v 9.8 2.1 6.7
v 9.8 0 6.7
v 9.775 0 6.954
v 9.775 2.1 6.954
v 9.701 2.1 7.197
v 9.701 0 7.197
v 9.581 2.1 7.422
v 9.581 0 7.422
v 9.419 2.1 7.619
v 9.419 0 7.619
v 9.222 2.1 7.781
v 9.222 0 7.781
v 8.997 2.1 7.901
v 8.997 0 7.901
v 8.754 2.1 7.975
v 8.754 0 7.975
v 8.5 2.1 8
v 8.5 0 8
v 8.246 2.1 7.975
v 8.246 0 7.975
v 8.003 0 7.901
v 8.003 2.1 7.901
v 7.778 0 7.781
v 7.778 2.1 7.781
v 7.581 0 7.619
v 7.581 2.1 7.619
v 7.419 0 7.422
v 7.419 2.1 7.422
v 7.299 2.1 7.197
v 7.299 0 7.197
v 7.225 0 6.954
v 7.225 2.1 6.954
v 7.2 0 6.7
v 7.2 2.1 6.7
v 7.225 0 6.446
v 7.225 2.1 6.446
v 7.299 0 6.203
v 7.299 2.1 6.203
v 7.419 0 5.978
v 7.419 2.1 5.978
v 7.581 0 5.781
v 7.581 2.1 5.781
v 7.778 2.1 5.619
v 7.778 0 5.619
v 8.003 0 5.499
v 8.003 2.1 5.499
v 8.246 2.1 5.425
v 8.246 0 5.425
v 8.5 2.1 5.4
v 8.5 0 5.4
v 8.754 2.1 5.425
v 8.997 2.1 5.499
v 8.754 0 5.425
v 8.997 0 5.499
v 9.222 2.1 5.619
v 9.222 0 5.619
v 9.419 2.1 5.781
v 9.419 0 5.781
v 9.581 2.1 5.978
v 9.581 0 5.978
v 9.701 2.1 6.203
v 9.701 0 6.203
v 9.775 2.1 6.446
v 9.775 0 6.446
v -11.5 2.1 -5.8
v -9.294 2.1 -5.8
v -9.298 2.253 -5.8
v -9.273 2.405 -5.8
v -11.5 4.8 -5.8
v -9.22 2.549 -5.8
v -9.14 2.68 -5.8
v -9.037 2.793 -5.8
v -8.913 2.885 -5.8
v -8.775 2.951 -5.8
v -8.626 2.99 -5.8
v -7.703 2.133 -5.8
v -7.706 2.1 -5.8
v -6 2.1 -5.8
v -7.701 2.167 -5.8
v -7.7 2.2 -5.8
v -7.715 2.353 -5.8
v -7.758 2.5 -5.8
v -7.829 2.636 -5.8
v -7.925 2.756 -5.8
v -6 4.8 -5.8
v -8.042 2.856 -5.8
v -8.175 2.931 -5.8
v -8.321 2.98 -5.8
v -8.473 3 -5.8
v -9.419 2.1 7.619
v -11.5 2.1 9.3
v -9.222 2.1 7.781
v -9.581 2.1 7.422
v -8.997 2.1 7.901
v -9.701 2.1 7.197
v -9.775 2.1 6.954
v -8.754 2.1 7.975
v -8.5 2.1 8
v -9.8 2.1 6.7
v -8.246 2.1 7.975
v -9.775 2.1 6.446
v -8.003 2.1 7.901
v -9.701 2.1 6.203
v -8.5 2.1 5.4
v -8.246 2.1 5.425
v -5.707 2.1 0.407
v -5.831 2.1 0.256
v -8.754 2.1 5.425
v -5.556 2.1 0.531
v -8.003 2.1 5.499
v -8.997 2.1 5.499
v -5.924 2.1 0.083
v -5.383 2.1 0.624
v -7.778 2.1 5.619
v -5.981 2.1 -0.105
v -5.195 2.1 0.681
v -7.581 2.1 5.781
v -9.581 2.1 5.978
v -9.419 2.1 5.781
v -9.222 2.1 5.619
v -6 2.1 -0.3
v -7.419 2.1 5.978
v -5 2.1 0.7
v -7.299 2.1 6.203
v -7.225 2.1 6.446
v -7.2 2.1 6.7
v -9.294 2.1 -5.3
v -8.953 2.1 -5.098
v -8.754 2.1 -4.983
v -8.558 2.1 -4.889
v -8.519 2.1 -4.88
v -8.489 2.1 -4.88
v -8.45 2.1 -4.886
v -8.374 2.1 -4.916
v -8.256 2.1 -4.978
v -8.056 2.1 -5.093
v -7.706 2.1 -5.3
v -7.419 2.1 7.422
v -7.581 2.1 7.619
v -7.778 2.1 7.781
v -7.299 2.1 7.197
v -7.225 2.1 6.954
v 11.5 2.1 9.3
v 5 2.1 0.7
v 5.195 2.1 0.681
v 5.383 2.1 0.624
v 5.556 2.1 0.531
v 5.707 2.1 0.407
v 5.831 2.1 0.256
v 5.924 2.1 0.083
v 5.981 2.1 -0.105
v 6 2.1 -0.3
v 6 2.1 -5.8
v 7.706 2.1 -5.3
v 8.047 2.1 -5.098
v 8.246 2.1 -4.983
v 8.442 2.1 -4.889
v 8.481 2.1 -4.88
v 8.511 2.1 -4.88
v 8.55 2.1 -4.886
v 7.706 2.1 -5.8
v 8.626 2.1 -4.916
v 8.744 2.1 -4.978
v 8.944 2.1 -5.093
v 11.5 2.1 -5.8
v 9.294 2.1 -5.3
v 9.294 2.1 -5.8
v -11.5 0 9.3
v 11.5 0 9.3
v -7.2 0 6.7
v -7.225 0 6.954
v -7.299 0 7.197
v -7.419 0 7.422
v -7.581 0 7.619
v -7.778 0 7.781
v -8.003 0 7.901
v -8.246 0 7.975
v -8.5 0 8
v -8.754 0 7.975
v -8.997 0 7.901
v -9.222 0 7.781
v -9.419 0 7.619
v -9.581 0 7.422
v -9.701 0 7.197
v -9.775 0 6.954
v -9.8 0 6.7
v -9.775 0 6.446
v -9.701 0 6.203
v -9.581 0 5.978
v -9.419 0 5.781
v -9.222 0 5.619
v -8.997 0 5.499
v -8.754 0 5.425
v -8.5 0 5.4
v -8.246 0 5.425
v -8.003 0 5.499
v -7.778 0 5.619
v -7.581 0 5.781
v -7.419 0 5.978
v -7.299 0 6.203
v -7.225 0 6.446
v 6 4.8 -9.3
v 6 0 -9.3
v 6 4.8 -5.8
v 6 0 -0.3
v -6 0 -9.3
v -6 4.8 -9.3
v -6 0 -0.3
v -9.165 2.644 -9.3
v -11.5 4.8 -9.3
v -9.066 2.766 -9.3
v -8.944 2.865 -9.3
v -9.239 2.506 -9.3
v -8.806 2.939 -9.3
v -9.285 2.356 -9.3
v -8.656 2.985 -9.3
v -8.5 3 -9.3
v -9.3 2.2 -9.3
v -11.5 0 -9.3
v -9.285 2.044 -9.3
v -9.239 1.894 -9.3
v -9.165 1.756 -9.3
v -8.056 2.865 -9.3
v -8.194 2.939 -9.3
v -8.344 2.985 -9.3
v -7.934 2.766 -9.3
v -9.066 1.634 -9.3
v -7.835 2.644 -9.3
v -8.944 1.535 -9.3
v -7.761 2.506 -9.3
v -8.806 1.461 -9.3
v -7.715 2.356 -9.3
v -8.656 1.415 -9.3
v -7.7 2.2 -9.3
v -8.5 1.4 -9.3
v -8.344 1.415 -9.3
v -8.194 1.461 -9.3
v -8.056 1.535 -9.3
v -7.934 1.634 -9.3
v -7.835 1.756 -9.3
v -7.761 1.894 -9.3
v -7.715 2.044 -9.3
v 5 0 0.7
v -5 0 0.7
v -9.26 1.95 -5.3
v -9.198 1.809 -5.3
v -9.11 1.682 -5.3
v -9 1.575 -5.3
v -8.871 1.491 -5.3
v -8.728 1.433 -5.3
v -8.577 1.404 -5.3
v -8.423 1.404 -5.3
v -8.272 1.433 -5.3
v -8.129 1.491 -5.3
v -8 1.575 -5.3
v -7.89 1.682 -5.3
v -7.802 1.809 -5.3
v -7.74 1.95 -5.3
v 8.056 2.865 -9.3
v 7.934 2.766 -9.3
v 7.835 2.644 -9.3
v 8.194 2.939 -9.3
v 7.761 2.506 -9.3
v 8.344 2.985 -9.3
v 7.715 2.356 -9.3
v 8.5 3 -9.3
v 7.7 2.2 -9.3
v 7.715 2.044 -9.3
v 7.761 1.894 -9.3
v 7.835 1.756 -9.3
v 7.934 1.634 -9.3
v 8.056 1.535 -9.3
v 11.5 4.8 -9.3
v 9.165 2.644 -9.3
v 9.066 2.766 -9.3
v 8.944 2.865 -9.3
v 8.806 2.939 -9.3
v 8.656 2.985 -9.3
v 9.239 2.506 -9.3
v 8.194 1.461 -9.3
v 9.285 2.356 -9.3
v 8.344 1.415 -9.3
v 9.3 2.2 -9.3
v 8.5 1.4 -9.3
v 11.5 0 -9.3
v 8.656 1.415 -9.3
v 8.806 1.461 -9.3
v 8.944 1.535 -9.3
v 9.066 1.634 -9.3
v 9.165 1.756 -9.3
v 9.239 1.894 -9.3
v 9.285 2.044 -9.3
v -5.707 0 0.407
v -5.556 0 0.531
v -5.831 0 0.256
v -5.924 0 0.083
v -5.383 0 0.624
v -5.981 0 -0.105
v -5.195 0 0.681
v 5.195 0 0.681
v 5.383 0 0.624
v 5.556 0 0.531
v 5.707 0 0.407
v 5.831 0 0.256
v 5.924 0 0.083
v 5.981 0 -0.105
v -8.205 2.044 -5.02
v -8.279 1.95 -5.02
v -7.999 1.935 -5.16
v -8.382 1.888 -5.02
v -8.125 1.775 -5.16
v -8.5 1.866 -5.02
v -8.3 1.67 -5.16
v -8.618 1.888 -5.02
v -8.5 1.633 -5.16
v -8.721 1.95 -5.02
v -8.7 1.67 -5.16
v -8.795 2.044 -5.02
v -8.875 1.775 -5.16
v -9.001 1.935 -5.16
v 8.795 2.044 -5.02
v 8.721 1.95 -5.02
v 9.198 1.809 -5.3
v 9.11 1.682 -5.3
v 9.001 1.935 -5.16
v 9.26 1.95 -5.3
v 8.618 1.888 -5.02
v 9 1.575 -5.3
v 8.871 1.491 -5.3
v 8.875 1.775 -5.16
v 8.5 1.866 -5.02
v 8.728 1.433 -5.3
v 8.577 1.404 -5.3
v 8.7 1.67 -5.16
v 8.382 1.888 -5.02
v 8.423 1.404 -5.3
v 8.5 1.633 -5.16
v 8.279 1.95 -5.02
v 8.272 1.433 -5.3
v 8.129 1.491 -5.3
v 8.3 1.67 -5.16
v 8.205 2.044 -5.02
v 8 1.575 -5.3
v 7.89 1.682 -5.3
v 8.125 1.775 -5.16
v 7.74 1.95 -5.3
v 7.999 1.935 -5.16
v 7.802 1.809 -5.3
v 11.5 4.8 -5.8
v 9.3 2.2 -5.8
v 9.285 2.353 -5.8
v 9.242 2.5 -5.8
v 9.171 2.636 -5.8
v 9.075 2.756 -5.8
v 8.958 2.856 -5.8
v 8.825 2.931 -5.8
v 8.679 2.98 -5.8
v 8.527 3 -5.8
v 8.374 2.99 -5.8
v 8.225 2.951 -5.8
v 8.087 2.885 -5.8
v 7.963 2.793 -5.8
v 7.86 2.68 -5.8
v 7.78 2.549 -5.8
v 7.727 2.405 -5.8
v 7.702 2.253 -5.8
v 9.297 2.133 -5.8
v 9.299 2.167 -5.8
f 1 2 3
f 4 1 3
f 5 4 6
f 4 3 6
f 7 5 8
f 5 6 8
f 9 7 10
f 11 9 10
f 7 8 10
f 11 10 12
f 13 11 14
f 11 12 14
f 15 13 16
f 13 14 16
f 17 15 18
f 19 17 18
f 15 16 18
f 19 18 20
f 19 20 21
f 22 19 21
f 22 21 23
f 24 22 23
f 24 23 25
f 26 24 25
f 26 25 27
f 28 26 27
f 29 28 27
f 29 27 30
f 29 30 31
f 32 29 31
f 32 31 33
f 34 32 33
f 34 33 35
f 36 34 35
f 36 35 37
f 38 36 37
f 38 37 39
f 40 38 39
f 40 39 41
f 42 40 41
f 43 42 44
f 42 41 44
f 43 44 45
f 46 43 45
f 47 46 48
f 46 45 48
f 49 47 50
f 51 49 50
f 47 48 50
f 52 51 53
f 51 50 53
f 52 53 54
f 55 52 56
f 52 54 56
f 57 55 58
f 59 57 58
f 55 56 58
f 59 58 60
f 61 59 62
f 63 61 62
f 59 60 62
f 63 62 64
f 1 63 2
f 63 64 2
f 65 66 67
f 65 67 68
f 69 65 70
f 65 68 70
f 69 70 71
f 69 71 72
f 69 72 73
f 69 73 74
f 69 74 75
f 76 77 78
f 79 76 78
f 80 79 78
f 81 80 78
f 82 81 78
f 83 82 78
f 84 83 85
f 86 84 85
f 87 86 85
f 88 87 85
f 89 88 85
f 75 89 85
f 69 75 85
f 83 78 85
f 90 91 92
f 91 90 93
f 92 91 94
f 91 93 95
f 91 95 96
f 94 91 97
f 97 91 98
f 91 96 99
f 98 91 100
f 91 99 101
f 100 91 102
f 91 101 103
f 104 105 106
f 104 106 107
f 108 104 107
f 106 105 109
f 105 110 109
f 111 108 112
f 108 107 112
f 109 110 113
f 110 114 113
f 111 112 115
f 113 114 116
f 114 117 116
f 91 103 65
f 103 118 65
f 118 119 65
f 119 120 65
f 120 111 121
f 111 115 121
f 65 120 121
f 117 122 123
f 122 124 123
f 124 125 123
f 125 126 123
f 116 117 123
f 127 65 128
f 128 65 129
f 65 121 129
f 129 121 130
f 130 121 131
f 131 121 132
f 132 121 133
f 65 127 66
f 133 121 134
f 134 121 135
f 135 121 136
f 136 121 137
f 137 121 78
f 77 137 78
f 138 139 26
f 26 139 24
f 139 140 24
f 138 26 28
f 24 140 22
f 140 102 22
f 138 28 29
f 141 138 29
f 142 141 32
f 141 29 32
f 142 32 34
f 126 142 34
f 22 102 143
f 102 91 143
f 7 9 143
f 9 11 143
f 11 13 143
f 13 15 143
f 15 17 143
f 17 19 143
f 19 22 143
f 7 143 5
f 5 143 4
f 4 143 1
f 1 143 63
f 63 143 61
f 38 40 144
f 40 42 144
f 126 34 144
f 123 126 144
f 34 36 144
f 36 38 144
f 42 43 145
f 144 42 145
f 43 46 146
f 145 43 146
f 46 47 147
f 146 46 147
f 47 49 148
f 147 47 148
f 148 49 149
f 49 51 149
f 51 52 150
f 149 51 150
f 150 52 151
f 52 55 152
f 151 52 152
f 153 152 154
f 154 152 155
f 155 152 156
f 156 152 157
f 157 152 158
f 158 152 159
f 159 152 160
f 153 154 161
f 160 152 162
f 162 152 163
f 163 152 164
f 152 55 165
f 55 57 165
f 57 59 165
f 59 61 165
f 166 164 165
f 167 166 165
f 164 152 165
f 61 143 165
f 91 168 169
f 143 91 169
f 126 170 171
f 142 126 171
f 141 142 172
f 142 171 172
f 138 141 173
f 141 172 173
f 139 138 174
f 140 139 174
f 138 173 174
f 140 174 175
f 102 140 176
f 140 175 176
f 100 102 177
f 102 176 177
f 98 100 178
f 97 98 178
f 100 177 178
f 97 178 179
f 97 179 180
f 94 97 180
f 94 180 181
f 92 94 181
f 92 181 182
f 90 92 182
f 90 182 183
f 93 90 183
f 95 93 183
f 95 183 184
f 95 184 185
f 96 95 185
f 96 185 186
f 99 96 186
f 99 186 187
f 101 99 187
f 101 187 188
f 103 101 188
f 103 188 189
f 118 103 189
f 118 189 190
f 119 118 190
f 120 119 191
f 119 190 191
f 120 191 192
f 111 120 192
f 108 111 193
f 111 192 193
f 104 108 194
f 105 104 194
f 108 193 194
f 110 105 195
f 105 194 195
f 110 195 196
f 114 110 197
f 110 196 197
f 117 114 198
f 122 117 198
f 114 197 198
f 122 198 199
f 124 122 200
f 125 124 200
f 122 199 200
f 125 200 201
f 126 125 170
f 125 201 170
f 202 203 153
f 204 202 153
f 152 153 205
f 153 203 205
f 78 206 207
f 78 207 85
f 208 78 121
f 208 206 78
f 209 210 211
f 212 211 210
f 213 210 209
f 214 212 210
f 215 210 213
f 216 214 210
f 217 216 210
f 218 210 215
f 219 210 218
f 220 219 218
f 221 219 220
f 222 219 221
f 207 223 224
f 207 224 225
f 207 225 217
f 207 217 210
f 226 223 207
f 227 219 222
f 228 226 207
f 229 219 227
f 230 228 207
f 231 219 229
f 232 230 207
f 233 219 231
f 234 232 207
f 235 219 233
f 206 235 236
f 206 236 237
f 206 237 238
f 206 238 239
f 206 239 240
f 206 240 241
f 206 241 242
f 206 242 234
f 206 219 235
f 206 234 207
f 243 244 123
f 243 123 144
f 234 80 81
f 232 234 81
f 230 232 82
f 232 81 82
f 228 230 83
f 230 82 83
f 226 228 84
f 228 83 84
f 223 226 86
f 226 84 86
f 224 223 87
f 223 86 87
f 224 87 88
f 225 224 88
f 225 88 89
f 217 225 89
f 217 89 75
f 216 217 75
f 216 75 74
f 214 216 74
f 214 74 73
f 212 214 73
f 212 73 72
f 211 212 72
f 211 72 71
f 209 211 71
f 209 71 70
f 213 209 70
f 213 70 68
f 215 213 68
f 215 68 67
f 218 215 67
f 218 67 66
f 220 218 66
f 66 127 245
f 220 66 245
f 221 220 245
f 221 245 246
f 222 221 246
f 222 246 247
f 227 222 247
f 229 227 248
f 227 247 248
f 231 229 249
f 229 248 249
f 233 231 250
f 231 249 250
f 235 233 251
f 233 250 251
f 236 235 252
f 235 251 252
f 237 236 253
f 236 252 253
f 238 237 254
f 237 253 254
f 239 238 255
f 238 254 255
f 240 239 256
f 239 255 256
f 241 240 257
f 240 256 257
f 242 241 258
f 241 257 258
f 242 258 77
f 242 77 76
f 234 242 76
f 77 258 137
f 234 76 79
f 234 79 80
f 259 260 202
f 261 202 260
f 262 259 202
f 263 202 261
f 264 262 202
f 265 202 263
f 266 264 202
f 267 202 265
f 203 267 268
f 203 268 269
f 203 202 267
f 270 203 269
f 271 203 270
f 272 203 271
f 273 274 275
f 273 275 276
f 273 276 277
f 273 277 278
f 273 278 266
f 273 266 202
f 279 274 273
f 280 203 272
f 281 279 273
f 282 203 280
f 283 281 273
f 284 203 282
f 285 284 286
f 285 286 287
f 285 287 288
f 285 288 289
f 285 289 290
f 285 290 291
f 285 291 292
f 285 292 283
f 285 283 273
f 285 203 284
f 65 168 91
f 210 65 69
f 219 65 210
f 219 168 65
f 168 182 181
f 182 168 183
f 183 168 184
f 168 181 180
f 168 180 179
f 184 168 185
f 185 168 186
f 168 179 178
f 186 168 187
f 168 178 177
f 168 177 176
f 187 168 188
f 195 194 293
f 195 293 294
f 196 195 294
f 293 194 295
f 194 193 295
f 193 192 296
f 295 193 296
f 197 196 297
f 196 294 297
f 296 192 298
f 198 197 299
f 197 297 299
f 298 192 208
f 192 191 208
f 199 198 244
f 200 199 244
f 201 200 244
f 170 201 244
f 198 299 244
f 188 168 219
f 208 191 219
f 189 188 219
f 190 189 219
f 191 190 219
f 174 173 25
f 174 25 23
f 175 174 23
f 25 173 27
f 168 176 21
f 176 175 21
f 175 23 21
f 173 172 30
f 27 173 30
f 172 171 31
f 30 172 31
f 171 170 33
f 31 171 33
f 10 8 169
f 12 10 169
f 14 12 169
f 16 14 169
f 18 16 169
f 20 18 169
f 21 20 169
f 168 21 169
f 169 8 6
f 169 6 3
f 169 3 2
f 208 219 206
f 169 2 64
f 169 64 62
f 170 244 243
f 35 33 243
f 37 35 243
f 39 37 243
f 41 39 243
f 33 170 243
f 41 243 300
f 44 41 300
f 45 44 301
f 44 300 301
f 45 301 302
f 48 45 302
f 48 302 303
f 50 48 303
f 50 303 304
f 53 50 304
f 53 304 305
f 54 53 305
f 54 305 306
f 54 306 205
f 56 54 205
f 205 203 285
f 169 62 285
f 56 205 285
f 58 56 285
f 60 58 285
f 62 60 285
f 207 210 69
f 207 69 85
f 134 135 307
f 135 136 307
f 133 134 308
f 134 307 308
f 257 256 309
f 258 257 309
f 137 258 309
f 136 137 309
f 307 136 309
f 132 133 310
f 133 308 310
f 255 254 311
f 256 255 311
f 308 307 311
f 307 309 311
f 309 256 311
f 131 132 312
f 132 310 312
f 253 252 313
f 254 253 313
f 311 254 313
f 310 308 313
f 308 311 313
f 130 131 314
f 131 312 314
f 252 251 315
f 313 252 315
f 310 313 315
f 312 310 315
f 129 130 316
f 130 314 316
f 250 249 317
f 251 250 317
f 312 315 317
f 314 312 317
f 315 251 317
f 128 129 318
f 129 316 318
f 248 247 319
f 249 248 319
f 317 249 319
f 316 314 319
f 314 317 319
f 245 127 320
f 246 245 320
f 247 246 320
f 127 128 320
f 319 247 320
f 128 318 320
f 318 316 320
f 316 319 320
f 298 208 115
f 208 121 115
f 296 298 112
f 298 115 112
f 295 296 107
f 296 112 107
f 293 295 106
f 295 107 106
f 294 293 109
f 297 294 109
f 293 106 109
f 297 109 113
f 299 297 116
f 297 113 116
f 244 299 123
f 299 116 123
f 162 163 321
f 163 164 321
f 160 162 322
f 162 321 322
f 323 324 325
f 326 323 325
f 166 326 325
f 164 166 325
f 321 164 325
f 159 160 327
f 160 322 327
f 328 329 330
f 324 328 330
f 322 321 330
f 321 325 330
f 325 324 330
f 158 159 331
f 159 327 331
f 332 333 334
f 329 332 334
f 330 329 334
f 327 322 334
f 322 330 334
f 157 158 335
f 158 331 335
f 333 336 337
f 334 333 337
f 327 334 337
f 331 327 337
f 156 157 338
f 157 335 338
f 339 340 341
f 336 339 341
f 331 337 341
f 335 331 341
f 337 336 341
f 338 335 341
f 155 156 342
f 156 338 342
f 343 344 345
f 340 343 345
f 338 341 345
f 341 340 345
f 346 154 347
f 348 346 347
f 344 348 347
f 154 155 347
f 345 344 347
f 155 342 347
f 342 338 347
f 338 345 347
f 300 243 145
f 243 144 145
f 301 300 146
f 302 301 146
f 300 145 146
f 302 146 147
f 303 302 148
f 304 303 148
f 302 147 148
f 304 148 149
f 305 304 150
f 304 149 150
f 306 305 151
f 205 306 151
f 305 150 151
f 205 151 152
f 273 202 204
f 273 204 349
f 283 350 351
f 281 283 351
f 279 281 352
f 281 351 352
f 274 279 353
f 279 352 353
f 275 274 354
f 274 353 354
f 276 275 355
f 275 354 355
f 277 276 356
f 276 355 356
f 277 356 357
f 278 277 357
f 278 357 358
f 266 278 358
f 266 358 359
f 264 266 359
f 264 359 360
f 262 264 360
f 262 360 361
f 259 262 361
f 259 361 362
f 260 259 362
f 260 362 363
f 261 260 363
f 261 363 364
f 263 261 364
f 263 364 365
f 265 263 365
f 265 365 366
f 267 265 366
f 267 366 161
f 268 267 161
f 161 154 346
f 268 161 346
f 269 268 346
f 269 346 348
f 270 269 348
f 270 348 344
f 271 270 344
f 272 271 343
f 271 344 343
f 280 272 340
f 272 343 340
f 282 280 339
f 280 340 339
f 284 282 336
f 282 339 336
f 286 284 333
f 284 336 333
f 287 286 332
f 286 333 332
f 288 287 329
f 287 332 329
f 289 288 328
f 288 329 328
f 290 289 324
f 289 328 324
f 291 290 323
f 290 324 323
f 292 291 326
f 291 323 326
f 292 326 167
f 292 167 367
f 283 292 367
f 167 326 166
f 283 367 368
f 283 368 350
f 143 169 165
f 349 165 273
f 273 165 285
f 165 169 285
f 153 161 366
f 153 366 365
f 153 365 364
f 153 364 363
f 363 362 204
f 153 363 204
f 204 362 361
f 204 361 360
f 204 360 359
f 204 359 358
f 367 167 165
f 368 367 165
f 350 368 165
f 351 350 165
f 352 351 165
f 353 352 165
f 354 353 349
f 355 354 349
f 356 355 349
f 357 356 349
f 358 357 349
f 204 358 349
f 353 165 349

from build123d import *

# Parameters (mm, degrees)
SKETCH1_W                 = 23
SKETCH1_H                 = 18.6
BOSS_EXTRUDE1_DEPTH       = 4.8
SKETCH2_W                 = 15.1
SKETCH2_H                 = 2.7
CUT_EXTRUDE1_DEPTH        = 27.8
SKETCH3_W                 = 12
SKETCH3_H                 = 10
CUT_EXTRUDE2_DEPTH        = 27.8
M2X0_4_TAPPED_HOLE1_D     = 1.6
M2X0_4_TAPPED_HOLE1_DEPTH = 4
M2X0_4_TAPPED_HOLE1_TIP   = 0.480688495
SKETCH7_R                 = 1.3
CUT_EXTRUDE3_DEPTH        = 27.8
FILLET1_R                 = 1


with BuildPart() as part:
    # Sketch1 → Boss-Extrude1 (new body)
    with BuildSketch(Plane(origin=(0, 0, 0), x_dir=(1, 0, 0), z_dir=(0, 1, 0))):
        Rectangle(SKETCH1_W, SKETCH1_H)
    extrude(amount=BOSS_EXTRUDE1_DEPTH)

    # Sketch2 → Cut-Extrude1 (cut)
    with BuildSketch(Plane(origin=(11.5, 0, 0), x_dir=(0, 0, -1), z_dir=(1, 0, 0))):
        with Locations((-1.75, 3.45)):
            Rectangle(SKETCH2_W, SKETCH2_H)
    extrude(amount=-CUT_EXTRUDE1_DEPTH, mode=Mode.SUBTRACT)

    # Sketch3 → Cut-Extrude2 (cut)
    with BuildSketch(Plane.XZ):
        with Locations((0, -4.3)):
            Rectangle(SKETCH3_W, SKETCH3_H)
    extrude(amount=-CUT_EXTRUDE2_DEPTH, mode=Mode.SUBTRACT)

    # M2x0.4 Tapped Hole1
    with Locations(Plane(origin=(0, 0, -9.3), x_dir=(-1, 0, 0), z_dir=(0, 0, -1))):
        with Locations((-8.5, 2.2), (8.5, 2.2)):
            Hole(M2X0_4_TAPPED_HOLE1_D / 2, depth=M2X0_4_TAPPED_HOLE1_DEPTH)
            with Locations((0, 0, -(M2X0_4_TAPPED_HOLE1_DEPTH + M2X0_4_TAPPED_HOLE1_TIP / 2))):  # 118° drill point
                Cone(0, M2X0_4_TAPPED_HOLE1_D / 2, M2X0_4_TAPPED_HOLE1_TIP, mode=Mode.SUBTRACT)

    # Sketch7 → Cut-Extrude3 (cut)
    with BuildSketch(Plane.XZ):
        with Locations((-8.5, 6.7)):
            Circle(SKETCH7_R)
        with Locations((8.5, 6.7)):
            Circle(SKETCH7_R)
    extrude(amount=-CUT_EXTRUDE3_DEPTH, mode=Mode.SUBTRACT)

    # Fillet1
    fillet1_edges = [part.edges().sort_by_distance(p)[0] for p in [
        (-6, 1.05, 0.7),
        (6, 1.05, 0.7),
    ]]
    fillet(fillet1_edges, radius=FILLET1_R)


solid = part.part
